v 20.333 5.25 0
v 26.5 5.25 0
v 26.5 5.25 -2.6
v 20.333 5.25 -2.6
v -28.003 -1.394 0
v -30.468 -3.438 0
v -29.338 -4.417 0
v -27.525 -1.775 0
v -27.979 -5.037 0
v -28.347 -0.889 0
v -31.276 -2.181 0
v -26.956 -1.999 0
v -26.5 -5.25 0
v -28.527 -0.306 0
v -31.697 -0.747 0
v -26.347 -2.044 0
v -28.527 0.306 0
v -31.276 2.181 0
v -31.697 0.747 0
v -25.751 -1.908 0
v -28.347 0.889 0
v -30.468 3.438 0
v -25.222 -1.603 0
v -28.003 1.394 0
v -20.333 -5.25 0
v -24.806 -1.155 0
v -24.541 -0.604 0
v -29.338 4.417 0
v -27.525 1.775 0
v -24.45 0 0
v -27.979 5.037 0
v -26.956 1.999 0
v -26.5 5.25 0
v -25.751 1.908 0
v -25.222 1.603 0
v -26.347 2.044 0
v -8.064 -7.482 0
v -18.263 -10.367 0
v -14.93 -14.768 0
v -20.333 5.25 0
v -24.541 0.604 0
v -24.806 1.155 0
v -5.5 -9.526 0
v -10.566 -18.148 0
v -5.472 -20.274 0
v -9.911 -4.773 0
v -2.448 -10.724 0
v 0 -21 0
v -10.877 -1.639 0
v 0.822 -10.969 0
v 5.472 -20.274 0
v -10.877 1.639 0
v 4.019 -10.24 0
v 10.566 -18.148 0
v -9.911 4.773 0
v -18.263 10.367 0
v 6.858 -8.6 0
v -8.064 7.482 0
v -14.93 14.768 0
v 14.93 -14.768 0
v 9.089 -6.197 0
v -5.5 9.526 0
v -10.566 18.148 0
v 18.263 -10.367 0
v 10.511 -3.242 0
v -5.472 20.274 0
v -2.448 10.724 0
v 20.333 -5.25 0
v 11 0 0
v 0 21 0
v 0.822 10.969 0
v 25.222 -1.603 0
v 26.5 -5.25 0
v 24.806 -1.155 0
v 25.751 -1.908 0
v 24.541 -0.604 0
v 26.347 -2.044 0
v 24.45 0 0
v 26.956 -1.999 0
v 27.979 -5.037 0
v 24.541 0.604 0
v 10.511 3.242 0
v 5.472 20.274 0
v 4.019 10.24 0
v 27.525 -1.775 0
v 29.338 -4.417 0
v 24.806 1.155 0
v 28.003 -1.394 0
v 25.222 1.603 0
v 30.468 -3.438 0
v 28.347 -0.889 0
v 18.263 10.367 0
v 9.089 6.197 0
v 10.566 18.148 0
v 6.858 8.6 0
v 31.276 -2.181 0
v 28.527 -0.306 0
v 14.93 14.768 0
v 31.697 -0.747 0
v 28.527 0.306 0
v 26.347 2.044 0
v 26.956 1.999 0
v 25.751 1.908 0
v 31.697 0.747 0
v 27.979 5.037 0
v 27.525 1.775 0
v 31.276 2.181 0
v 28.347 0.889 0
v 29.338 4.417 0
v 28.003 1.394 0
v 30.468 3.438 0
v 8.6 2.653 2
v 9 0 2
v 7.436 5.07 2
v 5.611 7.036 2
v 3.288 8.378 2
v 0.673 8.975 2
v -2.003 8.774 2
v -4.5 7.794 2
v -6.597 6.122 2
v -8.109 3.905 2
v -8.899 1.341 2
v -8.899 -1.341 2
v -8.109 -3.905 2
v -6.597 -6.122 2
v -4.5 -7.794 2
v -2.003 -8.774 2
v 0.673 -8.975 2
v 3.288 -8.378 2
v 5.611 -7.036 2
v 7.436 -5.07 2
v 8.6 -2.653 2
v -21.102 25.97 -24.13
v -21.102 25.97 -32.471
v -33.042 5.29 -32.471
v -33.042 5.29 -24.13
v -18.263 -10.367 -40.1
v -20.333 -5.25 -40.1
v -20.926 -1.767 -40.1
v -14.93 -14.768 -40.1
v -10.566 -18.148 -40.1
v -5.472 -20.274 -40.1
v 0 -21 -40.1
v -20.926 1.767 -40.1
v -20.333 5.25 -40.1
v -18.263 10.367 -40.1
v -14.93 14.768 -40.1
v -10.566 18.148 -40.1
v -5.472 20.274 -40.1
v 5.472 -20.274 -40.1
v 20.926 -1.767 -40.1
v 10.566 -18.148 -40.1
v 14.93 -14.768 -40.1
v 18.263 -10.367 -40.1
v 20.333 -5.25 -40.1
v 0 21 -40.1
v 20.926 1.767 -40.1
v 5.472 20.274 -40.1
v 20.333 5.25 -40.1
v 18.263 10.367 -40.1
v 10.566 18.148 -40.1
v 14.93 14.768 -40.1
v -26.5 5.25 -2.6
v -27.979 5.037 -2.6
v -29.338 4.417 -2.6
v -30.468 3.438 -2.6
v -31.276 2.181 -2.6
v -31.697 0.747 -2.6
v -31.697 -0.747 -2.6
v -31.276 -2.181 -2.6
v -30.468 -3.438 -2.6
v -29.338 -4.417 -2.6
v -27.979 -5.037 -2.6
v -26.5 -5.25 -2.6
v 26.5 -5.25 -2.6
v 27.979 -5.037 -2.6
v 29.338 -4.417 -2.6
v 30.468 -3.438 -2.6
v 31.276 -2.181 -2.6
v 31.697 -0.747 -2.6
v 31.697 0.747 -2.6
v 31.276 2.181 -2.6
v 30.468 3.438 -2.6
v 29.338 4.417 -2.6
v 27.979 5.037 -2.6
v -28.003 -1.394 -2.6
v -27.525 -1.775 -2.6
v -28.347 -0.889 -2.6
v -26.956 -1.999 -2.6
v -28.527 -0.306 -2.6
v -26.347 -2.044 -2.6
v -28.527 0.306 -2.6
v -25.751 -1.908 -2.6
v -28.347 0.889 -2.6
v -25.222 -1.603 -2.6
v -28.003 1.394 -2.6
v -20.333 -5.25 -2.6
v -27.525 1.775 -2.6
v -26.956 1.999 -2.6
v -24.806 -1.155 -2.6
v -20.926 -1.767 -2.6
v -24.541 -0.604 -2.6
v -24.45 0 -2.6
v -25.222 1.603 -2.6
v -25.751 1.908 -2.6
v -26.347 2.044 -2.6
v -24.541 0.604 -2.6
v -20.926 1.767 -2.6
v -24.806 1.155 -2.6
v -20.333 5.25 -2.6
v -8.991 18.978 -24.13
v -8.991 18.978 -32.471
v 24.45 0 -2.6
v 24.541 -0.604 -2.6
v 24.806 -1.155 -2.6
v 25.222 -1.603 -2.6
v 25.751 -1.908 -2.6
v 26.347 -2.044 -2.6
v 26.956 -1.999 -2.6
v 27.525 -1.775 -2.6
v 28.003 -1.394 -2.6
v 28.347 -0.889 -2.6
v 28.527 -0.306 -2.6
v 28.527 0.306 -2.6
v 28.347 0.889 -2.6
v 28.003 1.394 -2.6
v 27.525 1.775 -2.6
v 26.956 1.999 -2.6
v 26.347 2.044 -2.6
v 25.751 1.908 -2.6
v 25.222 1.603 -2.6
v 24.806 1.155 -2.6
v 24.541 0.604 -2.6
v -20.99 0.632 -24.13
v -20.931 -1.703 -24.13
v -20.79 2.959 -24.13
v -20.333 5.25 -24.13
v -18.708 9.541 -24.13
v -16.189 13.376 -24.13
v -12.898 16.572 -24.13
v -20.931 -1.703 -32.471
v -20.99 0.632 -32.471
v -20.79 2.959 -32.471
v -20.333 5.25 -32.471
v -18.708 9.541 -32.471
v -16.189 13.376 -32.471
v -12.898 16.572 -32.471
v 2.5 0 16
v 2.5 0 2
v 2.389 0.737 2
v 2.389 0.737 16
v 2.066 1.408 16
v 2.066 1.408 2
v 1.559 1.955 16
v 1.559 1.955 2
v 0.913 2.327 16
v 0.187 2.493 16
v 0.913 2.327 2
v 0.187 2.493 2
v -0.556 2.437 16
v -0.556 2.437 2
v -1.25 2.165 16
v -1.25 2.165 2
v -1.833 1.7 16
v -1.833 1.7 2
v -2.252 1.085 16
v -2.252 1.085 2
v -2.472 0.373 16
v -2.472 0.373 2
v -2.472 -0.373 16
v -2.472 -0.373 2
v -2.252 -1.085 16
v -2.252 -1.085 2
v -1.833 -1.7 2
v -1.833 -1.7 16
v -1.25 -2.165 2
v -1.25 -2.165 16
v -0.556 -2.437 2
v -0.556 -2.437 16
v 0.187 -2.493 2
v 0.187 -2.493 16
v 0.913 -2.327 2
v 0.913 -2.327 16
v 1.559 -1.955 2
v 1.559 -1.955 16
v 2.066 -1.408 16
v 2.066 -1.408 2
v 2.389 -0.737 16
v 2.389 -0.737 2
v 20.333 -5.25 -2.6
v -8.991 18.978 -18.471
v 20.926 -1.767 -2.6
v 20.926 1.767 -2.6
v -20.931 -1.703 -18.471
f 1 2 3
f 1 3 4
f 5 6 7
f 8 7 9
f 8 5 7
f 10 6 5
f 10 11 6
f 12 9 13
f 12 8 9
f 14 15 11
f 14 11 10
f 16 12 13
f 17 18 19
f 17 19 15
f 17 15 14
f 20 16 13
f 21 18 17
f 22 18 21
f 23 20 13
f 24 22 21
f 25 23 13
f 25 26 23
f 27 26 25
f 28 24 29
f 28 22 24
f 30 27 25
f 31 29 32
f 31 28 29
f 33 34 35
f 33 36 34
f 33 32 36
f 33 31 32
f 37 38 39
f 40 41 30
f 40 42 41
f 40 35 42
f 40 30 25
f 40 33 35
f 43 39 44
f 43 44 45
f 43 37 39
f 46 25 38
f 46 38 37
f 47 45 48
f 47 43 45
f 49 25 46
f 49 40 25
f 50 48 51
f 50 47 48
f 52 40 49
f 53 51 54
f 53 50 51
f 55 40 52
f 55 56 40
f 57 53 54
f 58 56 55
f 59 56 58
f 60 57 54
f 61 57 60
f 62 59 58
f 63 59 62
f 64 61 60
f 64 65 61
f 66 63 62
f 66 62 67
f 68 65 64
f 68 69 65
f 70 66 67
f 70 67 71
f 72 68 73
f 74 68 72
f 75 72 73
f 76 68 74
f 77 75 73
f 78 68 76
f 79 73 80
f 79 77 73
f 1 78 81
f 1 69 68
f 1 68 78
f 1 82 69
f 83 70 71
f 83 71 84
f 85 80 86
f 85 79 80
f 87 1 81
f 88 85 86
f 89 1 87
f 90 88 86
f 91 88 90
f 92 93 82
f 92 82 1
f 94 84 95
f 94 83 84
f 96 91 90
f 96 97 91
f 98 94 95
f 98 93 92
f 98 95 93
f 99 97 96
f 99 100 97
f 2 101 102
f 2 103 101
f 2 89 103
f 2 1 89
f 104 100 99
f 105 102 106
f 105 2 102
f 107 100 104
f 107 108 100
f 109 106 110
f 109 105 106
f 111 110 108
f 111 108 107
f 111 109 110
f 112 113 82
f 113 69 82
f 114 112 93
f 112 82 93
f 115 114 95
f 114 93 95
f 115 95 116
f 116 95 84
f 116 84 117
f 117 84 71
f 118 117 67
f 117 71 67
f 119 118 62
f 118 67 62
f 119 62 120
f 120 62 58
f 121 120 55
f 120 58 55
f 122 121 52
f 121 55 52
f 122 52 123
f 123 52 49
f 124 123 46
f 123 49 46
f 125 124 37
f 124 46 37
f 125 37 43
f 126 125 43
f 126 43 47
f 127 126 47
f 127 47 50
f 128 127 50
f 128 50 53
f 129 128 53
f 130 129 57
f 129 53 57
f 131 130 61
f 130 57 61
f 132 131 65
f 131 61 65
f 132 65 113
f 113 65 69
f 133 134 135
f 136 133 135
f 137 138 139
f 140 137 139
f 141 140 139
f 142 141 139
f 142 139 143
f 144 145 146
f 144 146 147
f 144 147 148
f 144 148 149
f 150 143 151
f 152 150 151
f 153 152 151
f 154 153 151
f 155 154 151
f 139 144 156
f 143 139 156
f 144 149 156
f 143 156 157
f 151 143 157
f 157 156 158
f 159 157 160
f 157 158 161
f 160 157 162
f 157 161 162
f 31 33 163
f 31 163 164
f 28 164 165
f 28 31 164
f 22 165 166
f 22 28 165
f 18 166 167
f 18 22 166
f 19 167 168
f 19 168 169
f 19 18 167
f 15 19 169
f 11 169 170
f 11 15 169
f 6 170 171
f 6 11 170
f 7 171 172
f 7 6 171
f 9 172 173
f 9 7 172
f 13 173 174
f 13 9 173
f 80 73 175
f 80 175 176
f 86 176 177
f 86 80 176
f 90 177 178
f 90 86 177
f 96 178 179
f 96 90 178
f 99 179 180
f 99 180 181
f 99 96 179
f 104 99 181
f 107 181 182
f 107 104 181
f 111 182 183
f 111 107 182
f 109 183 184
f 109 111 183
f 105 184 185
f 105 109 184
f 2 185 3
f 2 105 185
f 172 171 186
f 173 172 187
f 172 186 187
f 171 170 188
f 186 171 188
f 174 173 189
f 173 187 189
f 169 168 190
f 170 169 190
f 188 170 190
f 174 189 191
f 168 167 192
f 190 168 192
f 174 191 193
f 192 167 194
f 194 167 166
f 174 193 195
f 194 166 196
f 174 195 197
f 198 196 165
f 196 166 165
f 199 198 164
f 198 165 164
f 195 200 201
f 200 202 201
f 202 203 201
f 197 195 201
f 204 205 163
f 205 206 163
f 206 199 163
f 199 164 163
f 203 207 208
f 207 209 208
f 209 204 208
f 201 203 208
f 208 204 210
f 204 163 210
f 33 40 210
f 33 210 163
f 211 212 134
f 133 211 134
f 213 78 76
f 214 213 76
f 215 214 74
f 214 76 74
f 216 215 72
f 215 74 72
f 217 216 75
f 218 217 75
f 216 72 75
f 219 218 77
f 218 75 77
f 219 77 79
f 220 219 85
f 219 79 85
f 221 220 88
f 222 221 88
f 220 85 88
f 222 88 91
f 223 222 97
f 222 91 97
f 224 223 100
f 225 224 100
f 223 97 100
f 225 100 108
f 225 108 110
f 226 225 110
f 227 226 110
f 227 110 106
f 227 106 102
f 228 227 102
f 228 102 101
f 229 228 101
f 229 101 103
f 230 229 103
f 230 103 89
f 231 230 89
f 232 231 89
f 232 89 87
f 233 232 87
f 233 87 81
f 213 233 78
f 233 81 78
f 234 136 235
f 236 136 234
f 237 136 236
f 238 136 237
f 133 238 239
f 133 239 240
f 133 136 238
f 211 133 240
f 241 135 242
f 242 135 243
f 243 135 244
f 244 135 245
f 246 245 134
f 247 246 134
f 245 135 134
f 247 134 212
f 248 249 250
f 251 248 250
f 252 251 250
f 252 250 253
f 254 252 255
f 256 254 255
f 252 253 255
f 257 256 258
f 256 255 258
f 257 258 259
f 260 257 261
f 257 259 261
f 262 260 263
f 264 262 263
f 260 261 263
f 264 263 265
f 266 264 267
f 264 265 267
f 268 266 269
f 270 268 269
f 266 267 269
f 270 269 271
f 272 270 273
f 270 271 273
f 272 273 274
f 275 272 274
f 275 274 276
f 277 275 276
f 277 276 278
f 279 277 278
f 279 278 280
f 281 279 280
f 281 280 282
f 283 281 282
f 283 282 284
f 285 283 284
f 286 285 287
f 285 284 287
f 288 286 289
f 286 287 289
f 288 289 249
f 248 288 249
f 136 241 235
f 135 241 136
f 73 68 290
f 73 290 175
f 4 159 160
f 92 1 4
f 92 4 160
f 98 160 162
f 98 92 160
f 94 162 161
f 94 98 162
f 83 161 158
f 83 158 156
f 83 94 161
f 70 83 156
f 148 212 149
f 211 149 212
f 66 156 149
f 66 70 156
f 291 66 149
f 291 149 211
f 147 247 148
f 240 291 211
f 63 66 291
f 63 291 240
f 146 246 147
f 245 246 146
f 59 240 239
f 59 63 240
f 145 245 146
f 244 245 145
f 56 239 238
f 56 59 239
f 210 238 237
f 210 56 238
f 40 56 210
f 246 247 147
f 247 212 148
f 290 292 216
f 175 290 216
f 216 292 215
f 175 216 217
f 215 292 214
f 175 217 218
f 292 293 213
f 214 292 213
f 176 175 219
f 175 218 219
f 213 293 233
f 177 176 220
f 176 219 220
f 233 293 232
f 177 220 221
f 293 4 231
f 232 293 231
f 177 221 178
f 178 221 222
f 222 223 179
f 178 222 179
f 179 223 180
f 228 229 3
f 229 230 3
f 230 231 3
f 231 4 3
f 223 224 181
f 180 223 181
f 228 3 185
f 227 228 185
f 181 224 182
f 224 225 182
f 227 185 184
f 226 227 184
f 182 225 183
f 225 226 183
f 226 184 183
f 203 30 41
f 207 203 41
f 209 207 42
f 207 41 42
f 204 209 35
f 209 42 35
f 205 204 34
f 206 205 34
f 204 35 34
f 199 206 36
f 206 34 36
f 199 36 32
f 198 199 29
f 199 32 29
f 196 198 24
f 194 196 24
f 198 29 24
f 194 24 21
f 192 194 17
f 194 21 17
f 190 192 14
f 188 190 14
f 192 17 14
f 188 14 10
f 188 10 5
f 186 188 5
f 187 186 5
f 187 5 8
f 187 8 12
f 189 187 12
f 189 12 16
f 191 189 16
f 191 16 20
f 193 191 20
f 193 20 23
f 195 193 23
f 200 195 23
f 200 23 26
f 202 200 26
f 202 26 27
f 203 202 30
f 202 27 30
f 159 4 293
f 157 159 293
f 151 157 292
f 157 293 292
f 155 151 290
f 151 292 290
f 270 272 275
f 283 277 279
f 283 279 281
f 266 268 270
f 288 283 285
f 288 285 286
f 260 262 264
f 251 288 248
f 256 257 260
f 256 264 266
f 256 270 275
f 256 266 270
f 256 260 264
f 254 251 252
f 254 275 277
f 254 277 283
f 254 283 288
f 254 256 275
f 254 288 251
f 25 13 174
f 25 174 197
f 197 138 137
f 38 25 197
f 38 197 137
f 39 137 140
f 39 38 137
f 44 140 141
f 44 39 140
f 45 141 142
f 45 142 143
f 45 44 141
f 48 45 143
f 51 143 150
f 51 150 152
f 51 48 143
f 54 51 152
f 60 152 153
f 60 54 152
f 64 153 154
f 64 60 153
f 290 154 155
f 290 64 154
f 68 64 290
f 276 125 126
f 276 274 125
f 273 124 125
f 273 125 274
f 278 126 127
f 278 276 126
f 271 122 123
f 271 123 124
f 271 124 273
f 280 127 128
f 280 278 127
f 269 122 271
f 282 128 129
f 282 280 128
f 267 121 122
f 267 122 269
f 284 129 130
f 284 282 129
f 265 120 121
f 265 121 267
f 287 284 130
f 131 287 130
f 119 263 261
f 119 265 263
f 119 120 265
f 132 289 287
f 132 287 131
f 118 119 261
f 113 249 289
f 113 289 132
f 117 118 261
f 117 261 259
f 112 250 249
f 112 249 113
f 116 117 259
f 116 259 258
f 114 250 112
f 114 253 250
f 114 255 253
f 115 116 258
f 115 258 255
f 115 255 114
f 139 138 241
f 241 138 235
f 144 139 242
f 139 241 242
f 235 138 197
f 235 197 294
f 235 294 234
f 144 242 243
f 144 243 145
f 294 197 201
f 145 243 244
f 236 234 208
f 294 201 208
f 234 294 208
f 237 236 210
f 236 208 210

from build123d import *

# Parameters (mm, degrees)
BOSS_EXTRUDE1_DEPTH = 40.1
SKETCH3_R           = 9
SKETCH2_R           = 11
CUT_EXTRUDE1_START  = -37.5
CUT_EXTRUDE1_DEPTH  = 37.5
SKETCH6_R           = 2.05
CUT_EXTRUDE2_DEPTH  = 2.6
SKETCH7_R           = 2.5
BOSS_EXTRUDE2_DEPTH = 14
WRAP4_START         = -32.470653403
WRAP4_DEPTH         = 8.340653403
CUT_EXTRUDE4_DEPTH  = 8.340653
CUT_EXTRUDE5_DEPTH  = 14


# Read off the part's stored shape, not the designer's step: Wrap4
with BuildPart() as part:
    # Sketch1 → Boss-Extrude1 (new body)
    with BuildSketch(Plane.XY):
        with BuildLine():
            Line((26.5, 5.25), (20.333162568, 5.25))
            ThreePointArc((20.333162568, 5.25), (0, 21), (-20.333162568, 5.25))
            Line((-20.333162568, 5.25), (-26.5, 5.25))
            ThreePointArc((-26.5, 5.25), (-31.75, 0), (-26.5, -5.25))
            Line((-26.5, -5.25), (-20.333162568, -5.25))
            ThreePointArc((-20.333162568, -5.25), (0, -21), (20.333162568, -5.25))
            Line((20.333162568, -5.25), (26.5, -5.25))
            ThreePointArc((26.5, -5.25), (31.75, 0), (26.5, 5.25))
        make_face()
    extrude(amount=-BOSS_EXTRUDE1_DEPTH)

    # Sketch3 → Loft1 section 0
    with BuildSketch(Plane.XY.offset(2)):
        Circle(SKETCH3_R)
    # Sketch2 → Loft1 section 1
    with BuildSketch(Plane.XY):
        Circle(SKETCH2_R)
    loft()

    # Sketch4 → Cut-Extrude1 (cut)
    with BuildSketch(Plane(origin=(0, 0, -40.1), x_dir=(-1, 0, 0), z_dir=(0, 0, -1)).offset(CUT_EXTRUDE1_START)):
        with BuildLine():
            Line((-26.5, 5.25), (-20.333162568, 5.25))
            ThreePointArc((-20.333162568, 5.25), (-21, 0), (-20.333162568, -5.25))
            Line((-20.333162568, -5.25), (-26.5, -5.25))
            ThreePointArc((-26.5, -5.25), (-31.75, 0), (-26.5, 5.25))
        make_face()
        with BuildLine():
            Line((26.5, -5.25), (20.333162568, -5.25))
            ThreePointArc((20.333162568, -5.25), (21, 0), (20.333162568, 5.25))
            Line((20.333162568, 5.25), (26.5, 5.25))
            ThreePointArc((26.5, 5.25), (31.75, 0), (26.5, -5.25))
        make_face()
    extrude(amount=CUT_EXTRUDE1_DEPTH, mode=Mode.SUBTRACT)

    # Sketch6 → Cut-Extrude2 (cut)
    with BuildSketch(Plane.XY):
        with Locations((-26.5, 0)):
            Circle(SKETCH6_R)
        with Locations(Location((26.5, 0, 0), (0, 0, 180))):
            Circle(SKETCH6_R)
    extrude(amount=-CUT_EXTRUDE2_DEPTH, mode=Mode.SUBTRACT)

    # Sketch7 → Boss-Extrude2 (add)
    with BuildSketch(Plane.XY.offset(2)):
        Circle(SKETCH7_R)
    extrude(amount=BOSS_EXTRUDE2_DEPTH)

    # Wrap4 outline → Wrap4 (add)
    with BuildSketch(Plane.XY.offset(WRAP4_START)):
        with BuildLine():
            ThreePointArc((-20.9308697, -1.702555024), (-18.186533479, 10.5), (-8.990978947, 18.977942396))
            Line((-8.990978947, 18.977942396), (-16.269390476, 34.341038621))
            ThreePointArc((-16.269390476, 34.341038621), (-32.908965344, 19), (-37.874907076, -3.080813854))
            Line((-37.874907076, -3.080813854), (-20.9308697, -1.702555024))
        make_face()
    extrude(amount=WRAP4_DEPTH)

    # Sketch19 → Cut-Extrude4 (cut)
    with BuildSketch(Plane(origin=(0, 0, -32.470653403), x_dir=(-1, 0, 0), z_dir=(0, 0, -1))):
        with BuildLine():
            Line((16.269390476, 34.341038621), (37.874907076, -3.080813854))
            ThreePointArc((37.874907076, -3.080813854), (32.908965344, 19), (16.269390476, 34.341038621))
        make_face()
    extrude(amount=-CUT_EXTRUDE4_DEPTH, mode=Mode.SUBTRACT)

    # Sketch20 → Cut-Extrude5 (cut)
    with BuildSketch(Plane(origin=(0, 0, -32.470653403), x_dir=(-1, 0, 0), z_dir=(0, 0, -1))):
        Polygon((16.269390476, 34.341038621), (8.990978947, 18.977942396), (21.1022034, 25.970361093), align=None)
        Polygon((37.874907076, -3.080813854), (20.9308697, -1.702555024), (33.042094152, 5.289863673), align=None)
    extrude(amount=-CUT_EXTRUDE5_DEPTH, mode=Mode.SUBTRACT)


solid = part.part
